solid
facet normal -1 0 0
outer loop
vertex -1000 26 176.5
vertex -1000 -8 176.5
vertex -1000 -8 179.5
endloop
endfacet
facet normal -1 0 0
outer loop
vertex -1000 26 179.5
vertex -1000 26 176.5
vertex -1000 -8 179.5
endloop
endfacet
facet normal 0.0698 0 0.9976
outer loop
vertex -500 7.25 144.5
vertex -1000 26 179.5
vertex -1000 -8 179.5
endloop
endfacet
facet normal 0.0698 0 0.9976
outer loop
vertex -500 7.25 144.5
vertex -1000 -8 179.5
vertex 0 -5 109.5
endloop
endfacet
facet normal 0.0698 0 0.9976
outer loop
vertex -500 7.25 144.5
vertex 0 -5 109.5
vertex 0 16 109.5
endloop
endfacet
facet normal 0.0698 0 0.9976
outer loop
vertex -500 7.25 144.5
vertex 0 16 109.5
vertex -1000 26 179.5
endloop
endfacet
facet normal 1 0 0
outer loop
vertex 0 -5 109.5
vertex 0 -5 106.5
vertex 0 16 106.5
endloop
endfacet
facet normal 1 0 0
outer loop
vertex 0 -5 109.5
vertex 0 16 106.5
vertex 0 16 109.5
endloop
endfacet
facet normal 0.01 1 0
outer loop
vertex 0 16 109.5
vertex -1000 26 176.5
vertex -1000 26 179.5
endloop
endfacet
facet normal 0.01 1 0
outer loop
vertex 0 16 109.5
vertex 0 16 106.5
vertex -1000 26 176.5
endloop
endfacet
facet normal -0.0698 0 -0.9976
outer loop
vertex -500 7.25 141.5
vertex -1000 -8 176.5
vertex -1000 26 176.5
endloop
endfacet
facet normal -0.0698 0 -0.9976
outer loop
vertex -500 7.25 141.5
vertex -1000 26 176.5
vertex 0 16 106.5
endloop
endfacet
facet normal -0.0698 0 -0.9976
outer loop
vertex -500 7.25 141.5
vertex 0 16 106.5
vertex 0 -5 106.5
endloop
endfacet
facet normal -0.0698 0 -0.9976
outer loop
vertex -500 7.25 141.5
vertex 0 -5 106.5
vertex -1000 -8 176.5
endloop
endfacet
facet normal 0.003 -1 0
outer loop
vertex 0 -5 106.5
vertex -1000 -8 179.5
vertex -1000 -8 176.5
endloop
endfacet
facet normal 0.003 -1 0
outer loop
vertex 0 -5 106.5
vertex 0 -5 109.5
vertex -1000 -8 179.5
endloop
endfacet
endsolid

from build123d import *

# Parameters (mm, degrees)
SKETCH_1_W               = 4.193920874
SKETCH_1_H               = 122.960997171
SKETCH_1_W_2             = 3
SKETCH_1_H_2             = 125.815298494
SKETCH_1_H_3             = 240
SKETCH_1_H_4             = 235.575244244
CUT_EXTRUDE_2_DEPTH      = 30
CUT_EXTRUDE_4_DEPTH      = 1017.315034938
CUT_EXTRUDE_4_DEPTH_BACK = 1017.315034938
SKETCH_24_W              = 1156.773882232
SKETCH_24_H              = 274.681970243


with BuildPart() as part:
    # Эскиз20 → По сечениям1 section 0
    with BuildSketch(Plane(origin=(-1000, 0, 0), x_dir=(0, 0, -1), z_dir=(1, 0, 0))):
        with BuildLine():
            Line((170.5, 0), (170.5, 25.918739381))
            Line((170.5, 25.918739381), (173.5, 25.918739381))
            Line((173.5, 25.918739381), (173.5, -8.081260619))
            Line((173.5, -8.081260619), (170.5, -8.081260619))
            Line((170.5, -8.081260619), (170.5, 0))
        make_face()
    # Эскиз14 → По сечениям1 section 1
    with BuildSketch(Plane(origin=(0, 0, 0), x_dir=(0, 0, -1), z_dir=(1, 0, 0))):
        with BuildLine():
            Line((100.5, 0), (100.5, -5))
            Line((100.5, -5), (103.5, -5))
            Line((103.5, -5), (103.5, 16))
            Line((103.5, 16), (100.5, 16))
            Line((100.5, 16), (100.5, 0))
        make_face()
    loft()

    # Эскиз1 → Вырез-Вытянуть2 (cut)
    with BuildSketch(Plane(origin=(0, 0, 0), x_dir=(1, 0, 0), z_dir=(0, 1, 0))):
        with Locations((-999.096960437, 178.519501415)):
            Rectangle(SKETCH_1_W, SKETCH_1_H)
        with Locations((-1.5, 62.907649247)):
            Rectangle(SKETCH_1_W_2, SKETCH_1_H_2)
        with Locations((-795.5, 120)):
            Rectangle(SKETCH_1_W_2, SKETCH_1_H_3)
        with Locations((-592.5, 117.787622122)):
            Rectangle(SKETCH_1_W_2, SKETCH_1_H_4)
        with Locations((-389.5, 117.787622122)):
            Rectangle(SKETCH_1_W_2, SKETCH_1_H_4)
        with Locations((-186.5, 117.787622122)):
            Rectangle(SKETCH_1_W_2, SKETCH_1_H_4)
    extrude(amount=CUT_EXTRUDE_2_DEPTH, mode=Mode.SUBTRACT)

    # Эскиз24 → Вырез-Вытянуть4 (cut, two sides: drawn at the far end of the back side and taken through both)
    with BuildSketch(Plane(origin=(0, 0, 0), x_dir=(1, 0, 0), z_dir=(0, 1, 0)).offset(-CUT_EXTRUDE_4_DEPTH_BACK)):
        with Locations((-473.050070844, 146.669806752)):
            Rectangle(SKETCH_24_W, SKETCH_24_H)
    extrude(amount=CUT_EXTRUDE_4_DEPTH + CUT_EXTRUDE_4_DEPTH_BACK, mode=Mode.SUBTRACT)


with BuildPart() as body_2:
    # По сечениям2: read off the stored shape, not the designer's step
    # По сечениям2: loft between two sections, ruled curve by curve
    loft_2_from = [
        Edge.make_line((-1000, -8, 176.5), (-1000, 26, 176.5)),
        Edge.make_line((-1000, -8, 179.5), (-1000, -8, 176.5)),
        Edge.make_line((-1000, 26, 176.5), (-1000, 26, 179.5)),
        Edge.make_line((-1000, 26, 179.5), (-1000, -8, 179.5)),
    ]
    loft_2_to = [
        Edge.make_line((0, -5, 106.5), (0, 16, 106.5)),
        Edge.make_line((0, -5, 109.5), (0, -5, 106.5)),
        Edge.make_line((0, 16, 106.5), (0, 16, 109.5)),
        Edge.make_line((0, 16, 109.5), (0, -5, 109.5)),
    ]
    loft_2 = Solid(Shell([*[Face.make_surface_from_curves(loft_2_from[k], loft_2_to[k]) for k in range(4)], Face(Wire(loft_2_from)), Face(Wire(loft_2_to))]))
    add(loft_2)


solid = body_2.part
